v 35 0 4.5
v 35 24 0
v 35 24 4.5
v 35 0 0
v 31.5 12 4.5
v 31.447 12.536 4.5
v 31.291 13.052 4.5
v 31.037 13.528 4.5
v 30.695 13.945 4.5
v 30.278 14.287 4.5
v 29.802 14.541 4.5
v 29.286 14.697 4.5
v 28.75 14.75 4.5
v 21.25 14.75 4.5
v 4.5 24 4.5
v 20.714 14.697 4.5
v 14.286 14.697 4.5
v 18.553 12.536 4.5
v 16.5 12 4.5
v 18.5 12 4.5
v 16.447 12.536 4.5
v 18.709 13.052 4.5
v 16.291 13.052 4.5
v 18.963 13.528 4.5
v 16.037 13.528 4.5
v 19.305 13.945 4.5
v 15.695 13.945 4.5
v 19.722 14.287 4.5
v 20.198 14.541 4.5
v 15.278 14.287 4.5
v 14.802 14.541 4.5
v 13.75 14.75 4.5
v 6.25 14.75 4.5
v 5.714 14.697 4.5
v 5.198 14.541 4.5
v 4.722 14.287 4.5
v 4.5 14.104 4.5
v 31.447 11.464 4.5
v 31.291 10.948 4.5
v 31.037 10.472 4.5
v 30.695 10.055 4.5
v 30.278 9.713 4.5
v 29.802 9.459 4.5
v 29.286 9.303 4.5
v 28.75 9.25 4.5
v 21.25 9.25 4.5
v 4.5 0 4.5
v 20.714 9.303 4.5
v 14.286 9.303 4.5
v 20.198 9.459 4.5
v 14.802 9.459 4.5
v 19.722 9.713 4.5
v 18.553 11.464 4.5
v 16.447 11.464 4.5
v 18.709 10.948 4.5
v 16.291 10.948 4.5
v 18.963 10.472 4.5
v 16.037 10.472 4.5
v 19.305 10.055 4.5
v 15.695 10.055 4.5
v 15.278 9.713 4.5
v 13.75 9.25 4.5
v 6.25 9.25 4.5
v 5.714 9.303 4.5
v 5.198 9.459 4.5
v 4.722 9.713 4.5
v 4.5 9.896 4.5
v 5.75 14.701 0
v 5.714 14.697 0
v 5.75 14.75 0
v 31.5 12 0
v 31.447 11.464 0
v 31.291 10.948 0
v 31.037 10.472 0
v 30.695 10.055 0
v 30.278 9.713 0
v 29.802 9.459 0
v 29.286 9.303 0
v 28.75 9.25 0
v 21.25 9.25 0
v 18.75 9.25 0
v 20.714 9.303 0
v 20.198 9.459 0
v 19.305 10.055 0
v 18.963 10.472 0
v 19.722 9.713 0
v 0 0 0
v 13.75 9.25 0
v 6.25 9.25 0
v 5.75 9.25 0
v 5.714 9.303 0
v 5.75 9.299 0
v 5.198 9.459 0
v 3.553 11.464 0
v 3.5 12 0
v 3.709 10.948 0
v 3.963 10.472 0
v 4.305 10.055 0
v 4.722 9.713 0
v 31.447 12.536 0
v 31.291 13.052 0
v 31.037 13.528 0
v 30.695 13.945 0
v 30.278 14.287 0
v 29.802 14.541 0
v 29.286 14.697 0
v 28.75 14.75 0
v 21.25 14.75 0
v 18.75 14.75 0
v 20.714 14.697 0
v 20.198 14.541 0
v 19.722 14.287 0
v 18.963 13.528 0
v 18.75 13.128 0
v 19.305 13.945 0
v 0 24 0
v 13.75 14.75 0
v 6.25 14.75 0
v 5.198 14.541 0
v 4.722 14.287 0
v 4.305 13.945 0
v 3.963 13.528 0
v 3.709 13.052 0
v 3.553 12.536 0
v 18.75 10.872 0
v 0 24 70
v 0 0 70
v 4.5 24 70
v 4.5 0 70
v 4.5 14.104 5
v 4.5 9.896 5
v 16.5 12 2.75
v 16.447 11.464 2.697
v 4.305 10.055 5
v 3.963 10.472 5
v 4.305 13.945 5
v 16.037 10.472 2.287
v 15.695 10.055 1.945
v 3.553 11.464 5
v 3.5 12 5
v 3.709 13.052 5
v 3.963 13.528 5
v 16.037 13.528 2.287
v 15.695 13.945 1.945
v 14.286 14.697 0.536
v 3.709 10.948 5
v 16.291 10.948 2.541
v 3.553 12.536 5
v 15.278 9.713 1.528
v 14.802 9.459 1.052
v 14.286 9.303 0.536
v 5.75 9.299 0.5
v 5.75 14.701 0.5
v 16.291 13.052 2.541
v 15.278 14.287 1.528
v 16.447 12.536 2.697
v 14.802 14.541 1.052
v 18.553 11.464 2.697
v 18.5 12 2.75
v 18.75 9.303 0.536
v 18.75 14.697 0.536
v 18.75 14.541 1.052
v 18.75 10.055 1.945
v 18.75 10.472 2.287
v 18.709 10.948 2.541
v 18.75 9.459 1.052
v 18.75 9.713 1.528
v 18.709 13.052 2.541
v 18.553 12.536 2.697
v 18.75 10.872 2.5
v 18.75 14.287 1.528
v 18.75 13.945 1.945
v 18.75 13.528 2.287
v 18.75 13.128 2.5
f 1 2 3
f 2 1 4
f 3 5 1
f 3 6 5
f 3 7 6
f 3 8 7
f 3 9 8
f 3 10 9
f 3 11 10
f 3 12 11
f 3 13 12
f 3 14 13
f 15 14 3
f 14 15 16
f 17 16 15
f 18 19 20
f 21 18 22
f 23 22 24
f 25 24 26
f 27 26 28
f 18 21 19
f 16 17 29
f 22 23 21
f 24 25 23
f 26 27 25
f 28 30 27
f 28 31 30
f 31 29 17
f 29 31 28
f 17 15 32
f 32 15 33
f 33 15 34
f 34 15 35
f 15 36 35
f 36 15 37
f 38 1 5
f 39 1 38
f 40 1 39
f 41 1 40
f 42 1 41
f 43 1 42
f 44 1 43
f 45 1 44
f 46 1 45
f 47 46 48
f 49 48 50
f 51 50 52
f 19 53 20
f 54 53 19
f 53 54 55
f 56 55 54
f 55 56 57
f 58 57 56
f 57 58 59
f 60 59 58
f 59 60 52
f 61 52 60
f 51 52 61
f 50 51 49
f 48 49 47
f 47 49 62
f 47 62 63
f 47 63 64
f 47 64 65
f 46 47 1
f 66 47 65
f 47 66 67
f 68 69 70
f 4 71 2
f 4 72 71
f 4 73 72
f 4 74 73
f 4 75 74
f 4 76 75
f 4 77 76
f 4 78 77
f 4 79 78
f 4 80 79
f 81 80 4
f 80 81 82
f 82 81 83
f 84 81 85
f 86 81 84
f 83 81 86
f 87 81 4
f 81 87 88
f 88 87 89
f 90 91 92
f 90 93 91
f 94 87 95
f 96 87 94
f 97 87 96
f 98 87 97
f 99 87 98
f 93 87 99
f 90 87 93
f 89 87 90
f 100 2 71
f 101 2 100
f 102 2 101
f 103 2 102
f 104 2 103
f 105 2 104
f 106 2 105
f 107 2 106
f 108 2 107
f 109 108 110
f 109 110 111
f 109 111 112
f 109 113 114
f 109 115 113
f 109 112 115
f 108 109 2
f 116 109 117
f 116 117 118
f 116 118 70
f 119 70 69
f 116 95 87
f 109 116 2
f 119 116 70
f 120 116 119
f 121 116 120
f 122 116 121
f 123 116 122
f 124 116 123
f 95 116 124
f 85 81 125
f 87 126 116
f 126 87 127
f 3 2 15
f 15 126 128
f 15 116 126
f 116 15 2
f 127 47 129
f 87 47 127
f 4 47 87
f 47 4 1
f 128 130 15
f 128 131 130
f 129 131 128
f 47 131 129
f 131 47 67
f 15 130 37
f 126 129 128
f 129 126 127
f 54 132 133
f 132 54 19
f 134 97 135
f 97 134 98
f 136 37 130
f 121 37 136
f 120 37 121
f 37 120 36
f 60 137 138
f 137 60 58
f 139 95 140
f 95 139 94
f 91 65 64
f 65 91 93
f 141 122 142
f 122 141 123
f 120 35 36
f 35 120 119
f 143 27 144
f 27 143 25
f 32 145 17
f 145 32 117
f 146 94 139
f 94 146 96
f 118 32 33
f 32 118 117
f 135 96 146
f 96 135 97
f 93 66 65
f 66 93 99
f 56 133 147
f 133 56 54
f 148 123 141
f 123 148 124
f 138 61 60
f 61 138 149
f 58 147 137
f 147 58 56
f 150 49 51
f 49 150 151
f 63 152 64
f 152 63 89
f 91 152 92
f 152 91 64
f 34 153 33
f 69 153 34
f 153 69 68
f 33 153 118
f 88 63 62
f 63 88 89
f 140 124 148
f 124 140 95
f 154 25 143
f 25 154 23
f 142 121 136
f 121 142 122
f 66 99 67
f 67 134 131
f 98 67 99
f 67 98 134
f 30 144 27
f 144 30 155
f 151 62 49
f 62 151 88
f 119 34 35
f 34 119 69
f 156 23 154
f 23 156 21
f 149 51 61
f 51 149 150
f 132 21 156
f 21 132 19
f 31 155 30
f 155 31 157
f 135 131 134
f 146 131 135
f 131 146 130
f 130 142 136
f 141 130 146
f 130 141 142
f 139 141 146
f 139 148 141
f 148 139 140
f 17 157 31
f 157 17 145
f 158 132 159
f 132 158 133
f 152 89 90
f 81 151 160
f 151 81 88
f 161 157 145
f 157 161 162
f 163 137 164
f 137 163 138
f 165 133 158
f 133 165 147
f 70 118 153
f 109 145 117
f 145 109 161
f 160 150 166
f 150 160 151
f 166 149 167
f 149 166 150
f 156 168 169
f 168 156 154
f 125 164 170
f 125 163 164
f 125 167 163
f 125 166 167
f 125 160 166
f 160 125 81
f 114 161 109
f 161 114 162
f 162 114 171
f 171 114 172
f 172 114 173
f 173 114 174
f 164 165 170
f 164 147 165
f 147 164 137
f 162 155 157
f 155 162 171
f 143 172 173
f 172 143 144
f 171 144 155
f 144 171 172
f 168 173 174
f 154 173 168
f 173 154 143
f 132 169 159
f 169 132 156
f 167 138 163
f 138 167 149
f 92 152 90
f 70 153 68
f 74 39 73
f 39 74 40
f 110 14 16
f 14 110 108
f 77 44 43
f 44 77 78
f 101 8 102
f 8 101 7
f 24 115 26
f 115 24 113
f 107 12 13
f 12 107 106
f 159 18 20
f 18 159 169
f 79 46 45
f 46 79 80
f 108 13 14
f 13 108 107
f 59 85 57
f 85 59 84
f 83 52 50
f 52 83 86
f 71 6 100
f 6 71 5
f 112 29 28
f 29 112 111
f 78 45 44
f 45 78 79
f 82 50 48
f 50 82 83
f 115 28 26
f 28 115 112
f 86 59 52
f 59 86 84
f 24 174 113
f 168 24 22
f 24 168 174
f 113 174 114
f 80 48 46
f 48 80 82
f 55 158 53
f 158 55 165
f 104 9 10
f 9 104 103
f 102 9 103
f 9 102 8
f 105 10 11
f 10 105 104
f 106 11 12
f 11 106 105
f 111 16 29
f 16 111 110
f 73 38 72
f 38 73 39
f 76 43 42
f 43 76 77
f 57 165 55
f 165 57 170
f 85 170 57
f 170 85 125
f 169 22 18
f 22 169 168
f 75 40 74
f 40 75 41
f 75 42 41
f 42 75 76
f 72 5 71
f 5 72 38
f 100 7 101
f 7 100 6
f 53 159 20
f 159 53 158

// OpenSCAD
$fn = 32;

// ----------------------------------------------------------------------
// L-bracket: 35 x 24 x 70 mm
// ----------------------------------------------------------------------

// --- parameters (mm) ---
leg_a = 35;               // horizontal leg, X
leg_b = 70;               // vertical leg, Z
depth = 24;               // bracket depth, Y
thick = 4.5;              // plate thickness
hole_d = 4.5;             // clearance for M4
slot_w = 5.5;             // euro screw slot width
slot_l = 13;              // euro screw slot length

module hole_z(px, py) {
  translate([px, py, -0.5]) cylinder(h = thick + 1, d = hole_d);
}
module hole_x(pz, py) {
  translate([-0.5, py, pz]) rotate([0, 90, 0]) cylinder(h = thick + 1, d = hole_d);
}
module euro_slot_z(px, py) {
  hull() {
    translate([px - (slot_l - slot_w) / 2, py, -0.5]) cylinder(h = thick + 1, d = slot_w);
    translate([px + (slot_l - slot_w) / 2, py, -0.5]) cylinder(h = thick + 1, d = slot_w);
  }
}
module euro_slot_x(pz, py) {
  translate([-0.5, 0, 0]) rotate([0, 90, 0]) hull() {
    translate([0, py, pz - (slot_l - slot_w) / 2]) cylinder(h = thick + 1, d = slot_w);
    translate([0, py, pz + (slot_l - slot_w) / 2]) cylinder(h = thick + 1, d = slot_w);
  }
}

difference() {
  union() {
    /* horizontal leg */
    cube([leg_a, depth, thick]);
    /* vertical leg, overlapping the corner block */
    cube([thick, depth, leg_b]);
  }
  euro_slot_z(10, 12);
  euro_slot_x(10, 12);
  euro_slot_z(25, 12);
}
